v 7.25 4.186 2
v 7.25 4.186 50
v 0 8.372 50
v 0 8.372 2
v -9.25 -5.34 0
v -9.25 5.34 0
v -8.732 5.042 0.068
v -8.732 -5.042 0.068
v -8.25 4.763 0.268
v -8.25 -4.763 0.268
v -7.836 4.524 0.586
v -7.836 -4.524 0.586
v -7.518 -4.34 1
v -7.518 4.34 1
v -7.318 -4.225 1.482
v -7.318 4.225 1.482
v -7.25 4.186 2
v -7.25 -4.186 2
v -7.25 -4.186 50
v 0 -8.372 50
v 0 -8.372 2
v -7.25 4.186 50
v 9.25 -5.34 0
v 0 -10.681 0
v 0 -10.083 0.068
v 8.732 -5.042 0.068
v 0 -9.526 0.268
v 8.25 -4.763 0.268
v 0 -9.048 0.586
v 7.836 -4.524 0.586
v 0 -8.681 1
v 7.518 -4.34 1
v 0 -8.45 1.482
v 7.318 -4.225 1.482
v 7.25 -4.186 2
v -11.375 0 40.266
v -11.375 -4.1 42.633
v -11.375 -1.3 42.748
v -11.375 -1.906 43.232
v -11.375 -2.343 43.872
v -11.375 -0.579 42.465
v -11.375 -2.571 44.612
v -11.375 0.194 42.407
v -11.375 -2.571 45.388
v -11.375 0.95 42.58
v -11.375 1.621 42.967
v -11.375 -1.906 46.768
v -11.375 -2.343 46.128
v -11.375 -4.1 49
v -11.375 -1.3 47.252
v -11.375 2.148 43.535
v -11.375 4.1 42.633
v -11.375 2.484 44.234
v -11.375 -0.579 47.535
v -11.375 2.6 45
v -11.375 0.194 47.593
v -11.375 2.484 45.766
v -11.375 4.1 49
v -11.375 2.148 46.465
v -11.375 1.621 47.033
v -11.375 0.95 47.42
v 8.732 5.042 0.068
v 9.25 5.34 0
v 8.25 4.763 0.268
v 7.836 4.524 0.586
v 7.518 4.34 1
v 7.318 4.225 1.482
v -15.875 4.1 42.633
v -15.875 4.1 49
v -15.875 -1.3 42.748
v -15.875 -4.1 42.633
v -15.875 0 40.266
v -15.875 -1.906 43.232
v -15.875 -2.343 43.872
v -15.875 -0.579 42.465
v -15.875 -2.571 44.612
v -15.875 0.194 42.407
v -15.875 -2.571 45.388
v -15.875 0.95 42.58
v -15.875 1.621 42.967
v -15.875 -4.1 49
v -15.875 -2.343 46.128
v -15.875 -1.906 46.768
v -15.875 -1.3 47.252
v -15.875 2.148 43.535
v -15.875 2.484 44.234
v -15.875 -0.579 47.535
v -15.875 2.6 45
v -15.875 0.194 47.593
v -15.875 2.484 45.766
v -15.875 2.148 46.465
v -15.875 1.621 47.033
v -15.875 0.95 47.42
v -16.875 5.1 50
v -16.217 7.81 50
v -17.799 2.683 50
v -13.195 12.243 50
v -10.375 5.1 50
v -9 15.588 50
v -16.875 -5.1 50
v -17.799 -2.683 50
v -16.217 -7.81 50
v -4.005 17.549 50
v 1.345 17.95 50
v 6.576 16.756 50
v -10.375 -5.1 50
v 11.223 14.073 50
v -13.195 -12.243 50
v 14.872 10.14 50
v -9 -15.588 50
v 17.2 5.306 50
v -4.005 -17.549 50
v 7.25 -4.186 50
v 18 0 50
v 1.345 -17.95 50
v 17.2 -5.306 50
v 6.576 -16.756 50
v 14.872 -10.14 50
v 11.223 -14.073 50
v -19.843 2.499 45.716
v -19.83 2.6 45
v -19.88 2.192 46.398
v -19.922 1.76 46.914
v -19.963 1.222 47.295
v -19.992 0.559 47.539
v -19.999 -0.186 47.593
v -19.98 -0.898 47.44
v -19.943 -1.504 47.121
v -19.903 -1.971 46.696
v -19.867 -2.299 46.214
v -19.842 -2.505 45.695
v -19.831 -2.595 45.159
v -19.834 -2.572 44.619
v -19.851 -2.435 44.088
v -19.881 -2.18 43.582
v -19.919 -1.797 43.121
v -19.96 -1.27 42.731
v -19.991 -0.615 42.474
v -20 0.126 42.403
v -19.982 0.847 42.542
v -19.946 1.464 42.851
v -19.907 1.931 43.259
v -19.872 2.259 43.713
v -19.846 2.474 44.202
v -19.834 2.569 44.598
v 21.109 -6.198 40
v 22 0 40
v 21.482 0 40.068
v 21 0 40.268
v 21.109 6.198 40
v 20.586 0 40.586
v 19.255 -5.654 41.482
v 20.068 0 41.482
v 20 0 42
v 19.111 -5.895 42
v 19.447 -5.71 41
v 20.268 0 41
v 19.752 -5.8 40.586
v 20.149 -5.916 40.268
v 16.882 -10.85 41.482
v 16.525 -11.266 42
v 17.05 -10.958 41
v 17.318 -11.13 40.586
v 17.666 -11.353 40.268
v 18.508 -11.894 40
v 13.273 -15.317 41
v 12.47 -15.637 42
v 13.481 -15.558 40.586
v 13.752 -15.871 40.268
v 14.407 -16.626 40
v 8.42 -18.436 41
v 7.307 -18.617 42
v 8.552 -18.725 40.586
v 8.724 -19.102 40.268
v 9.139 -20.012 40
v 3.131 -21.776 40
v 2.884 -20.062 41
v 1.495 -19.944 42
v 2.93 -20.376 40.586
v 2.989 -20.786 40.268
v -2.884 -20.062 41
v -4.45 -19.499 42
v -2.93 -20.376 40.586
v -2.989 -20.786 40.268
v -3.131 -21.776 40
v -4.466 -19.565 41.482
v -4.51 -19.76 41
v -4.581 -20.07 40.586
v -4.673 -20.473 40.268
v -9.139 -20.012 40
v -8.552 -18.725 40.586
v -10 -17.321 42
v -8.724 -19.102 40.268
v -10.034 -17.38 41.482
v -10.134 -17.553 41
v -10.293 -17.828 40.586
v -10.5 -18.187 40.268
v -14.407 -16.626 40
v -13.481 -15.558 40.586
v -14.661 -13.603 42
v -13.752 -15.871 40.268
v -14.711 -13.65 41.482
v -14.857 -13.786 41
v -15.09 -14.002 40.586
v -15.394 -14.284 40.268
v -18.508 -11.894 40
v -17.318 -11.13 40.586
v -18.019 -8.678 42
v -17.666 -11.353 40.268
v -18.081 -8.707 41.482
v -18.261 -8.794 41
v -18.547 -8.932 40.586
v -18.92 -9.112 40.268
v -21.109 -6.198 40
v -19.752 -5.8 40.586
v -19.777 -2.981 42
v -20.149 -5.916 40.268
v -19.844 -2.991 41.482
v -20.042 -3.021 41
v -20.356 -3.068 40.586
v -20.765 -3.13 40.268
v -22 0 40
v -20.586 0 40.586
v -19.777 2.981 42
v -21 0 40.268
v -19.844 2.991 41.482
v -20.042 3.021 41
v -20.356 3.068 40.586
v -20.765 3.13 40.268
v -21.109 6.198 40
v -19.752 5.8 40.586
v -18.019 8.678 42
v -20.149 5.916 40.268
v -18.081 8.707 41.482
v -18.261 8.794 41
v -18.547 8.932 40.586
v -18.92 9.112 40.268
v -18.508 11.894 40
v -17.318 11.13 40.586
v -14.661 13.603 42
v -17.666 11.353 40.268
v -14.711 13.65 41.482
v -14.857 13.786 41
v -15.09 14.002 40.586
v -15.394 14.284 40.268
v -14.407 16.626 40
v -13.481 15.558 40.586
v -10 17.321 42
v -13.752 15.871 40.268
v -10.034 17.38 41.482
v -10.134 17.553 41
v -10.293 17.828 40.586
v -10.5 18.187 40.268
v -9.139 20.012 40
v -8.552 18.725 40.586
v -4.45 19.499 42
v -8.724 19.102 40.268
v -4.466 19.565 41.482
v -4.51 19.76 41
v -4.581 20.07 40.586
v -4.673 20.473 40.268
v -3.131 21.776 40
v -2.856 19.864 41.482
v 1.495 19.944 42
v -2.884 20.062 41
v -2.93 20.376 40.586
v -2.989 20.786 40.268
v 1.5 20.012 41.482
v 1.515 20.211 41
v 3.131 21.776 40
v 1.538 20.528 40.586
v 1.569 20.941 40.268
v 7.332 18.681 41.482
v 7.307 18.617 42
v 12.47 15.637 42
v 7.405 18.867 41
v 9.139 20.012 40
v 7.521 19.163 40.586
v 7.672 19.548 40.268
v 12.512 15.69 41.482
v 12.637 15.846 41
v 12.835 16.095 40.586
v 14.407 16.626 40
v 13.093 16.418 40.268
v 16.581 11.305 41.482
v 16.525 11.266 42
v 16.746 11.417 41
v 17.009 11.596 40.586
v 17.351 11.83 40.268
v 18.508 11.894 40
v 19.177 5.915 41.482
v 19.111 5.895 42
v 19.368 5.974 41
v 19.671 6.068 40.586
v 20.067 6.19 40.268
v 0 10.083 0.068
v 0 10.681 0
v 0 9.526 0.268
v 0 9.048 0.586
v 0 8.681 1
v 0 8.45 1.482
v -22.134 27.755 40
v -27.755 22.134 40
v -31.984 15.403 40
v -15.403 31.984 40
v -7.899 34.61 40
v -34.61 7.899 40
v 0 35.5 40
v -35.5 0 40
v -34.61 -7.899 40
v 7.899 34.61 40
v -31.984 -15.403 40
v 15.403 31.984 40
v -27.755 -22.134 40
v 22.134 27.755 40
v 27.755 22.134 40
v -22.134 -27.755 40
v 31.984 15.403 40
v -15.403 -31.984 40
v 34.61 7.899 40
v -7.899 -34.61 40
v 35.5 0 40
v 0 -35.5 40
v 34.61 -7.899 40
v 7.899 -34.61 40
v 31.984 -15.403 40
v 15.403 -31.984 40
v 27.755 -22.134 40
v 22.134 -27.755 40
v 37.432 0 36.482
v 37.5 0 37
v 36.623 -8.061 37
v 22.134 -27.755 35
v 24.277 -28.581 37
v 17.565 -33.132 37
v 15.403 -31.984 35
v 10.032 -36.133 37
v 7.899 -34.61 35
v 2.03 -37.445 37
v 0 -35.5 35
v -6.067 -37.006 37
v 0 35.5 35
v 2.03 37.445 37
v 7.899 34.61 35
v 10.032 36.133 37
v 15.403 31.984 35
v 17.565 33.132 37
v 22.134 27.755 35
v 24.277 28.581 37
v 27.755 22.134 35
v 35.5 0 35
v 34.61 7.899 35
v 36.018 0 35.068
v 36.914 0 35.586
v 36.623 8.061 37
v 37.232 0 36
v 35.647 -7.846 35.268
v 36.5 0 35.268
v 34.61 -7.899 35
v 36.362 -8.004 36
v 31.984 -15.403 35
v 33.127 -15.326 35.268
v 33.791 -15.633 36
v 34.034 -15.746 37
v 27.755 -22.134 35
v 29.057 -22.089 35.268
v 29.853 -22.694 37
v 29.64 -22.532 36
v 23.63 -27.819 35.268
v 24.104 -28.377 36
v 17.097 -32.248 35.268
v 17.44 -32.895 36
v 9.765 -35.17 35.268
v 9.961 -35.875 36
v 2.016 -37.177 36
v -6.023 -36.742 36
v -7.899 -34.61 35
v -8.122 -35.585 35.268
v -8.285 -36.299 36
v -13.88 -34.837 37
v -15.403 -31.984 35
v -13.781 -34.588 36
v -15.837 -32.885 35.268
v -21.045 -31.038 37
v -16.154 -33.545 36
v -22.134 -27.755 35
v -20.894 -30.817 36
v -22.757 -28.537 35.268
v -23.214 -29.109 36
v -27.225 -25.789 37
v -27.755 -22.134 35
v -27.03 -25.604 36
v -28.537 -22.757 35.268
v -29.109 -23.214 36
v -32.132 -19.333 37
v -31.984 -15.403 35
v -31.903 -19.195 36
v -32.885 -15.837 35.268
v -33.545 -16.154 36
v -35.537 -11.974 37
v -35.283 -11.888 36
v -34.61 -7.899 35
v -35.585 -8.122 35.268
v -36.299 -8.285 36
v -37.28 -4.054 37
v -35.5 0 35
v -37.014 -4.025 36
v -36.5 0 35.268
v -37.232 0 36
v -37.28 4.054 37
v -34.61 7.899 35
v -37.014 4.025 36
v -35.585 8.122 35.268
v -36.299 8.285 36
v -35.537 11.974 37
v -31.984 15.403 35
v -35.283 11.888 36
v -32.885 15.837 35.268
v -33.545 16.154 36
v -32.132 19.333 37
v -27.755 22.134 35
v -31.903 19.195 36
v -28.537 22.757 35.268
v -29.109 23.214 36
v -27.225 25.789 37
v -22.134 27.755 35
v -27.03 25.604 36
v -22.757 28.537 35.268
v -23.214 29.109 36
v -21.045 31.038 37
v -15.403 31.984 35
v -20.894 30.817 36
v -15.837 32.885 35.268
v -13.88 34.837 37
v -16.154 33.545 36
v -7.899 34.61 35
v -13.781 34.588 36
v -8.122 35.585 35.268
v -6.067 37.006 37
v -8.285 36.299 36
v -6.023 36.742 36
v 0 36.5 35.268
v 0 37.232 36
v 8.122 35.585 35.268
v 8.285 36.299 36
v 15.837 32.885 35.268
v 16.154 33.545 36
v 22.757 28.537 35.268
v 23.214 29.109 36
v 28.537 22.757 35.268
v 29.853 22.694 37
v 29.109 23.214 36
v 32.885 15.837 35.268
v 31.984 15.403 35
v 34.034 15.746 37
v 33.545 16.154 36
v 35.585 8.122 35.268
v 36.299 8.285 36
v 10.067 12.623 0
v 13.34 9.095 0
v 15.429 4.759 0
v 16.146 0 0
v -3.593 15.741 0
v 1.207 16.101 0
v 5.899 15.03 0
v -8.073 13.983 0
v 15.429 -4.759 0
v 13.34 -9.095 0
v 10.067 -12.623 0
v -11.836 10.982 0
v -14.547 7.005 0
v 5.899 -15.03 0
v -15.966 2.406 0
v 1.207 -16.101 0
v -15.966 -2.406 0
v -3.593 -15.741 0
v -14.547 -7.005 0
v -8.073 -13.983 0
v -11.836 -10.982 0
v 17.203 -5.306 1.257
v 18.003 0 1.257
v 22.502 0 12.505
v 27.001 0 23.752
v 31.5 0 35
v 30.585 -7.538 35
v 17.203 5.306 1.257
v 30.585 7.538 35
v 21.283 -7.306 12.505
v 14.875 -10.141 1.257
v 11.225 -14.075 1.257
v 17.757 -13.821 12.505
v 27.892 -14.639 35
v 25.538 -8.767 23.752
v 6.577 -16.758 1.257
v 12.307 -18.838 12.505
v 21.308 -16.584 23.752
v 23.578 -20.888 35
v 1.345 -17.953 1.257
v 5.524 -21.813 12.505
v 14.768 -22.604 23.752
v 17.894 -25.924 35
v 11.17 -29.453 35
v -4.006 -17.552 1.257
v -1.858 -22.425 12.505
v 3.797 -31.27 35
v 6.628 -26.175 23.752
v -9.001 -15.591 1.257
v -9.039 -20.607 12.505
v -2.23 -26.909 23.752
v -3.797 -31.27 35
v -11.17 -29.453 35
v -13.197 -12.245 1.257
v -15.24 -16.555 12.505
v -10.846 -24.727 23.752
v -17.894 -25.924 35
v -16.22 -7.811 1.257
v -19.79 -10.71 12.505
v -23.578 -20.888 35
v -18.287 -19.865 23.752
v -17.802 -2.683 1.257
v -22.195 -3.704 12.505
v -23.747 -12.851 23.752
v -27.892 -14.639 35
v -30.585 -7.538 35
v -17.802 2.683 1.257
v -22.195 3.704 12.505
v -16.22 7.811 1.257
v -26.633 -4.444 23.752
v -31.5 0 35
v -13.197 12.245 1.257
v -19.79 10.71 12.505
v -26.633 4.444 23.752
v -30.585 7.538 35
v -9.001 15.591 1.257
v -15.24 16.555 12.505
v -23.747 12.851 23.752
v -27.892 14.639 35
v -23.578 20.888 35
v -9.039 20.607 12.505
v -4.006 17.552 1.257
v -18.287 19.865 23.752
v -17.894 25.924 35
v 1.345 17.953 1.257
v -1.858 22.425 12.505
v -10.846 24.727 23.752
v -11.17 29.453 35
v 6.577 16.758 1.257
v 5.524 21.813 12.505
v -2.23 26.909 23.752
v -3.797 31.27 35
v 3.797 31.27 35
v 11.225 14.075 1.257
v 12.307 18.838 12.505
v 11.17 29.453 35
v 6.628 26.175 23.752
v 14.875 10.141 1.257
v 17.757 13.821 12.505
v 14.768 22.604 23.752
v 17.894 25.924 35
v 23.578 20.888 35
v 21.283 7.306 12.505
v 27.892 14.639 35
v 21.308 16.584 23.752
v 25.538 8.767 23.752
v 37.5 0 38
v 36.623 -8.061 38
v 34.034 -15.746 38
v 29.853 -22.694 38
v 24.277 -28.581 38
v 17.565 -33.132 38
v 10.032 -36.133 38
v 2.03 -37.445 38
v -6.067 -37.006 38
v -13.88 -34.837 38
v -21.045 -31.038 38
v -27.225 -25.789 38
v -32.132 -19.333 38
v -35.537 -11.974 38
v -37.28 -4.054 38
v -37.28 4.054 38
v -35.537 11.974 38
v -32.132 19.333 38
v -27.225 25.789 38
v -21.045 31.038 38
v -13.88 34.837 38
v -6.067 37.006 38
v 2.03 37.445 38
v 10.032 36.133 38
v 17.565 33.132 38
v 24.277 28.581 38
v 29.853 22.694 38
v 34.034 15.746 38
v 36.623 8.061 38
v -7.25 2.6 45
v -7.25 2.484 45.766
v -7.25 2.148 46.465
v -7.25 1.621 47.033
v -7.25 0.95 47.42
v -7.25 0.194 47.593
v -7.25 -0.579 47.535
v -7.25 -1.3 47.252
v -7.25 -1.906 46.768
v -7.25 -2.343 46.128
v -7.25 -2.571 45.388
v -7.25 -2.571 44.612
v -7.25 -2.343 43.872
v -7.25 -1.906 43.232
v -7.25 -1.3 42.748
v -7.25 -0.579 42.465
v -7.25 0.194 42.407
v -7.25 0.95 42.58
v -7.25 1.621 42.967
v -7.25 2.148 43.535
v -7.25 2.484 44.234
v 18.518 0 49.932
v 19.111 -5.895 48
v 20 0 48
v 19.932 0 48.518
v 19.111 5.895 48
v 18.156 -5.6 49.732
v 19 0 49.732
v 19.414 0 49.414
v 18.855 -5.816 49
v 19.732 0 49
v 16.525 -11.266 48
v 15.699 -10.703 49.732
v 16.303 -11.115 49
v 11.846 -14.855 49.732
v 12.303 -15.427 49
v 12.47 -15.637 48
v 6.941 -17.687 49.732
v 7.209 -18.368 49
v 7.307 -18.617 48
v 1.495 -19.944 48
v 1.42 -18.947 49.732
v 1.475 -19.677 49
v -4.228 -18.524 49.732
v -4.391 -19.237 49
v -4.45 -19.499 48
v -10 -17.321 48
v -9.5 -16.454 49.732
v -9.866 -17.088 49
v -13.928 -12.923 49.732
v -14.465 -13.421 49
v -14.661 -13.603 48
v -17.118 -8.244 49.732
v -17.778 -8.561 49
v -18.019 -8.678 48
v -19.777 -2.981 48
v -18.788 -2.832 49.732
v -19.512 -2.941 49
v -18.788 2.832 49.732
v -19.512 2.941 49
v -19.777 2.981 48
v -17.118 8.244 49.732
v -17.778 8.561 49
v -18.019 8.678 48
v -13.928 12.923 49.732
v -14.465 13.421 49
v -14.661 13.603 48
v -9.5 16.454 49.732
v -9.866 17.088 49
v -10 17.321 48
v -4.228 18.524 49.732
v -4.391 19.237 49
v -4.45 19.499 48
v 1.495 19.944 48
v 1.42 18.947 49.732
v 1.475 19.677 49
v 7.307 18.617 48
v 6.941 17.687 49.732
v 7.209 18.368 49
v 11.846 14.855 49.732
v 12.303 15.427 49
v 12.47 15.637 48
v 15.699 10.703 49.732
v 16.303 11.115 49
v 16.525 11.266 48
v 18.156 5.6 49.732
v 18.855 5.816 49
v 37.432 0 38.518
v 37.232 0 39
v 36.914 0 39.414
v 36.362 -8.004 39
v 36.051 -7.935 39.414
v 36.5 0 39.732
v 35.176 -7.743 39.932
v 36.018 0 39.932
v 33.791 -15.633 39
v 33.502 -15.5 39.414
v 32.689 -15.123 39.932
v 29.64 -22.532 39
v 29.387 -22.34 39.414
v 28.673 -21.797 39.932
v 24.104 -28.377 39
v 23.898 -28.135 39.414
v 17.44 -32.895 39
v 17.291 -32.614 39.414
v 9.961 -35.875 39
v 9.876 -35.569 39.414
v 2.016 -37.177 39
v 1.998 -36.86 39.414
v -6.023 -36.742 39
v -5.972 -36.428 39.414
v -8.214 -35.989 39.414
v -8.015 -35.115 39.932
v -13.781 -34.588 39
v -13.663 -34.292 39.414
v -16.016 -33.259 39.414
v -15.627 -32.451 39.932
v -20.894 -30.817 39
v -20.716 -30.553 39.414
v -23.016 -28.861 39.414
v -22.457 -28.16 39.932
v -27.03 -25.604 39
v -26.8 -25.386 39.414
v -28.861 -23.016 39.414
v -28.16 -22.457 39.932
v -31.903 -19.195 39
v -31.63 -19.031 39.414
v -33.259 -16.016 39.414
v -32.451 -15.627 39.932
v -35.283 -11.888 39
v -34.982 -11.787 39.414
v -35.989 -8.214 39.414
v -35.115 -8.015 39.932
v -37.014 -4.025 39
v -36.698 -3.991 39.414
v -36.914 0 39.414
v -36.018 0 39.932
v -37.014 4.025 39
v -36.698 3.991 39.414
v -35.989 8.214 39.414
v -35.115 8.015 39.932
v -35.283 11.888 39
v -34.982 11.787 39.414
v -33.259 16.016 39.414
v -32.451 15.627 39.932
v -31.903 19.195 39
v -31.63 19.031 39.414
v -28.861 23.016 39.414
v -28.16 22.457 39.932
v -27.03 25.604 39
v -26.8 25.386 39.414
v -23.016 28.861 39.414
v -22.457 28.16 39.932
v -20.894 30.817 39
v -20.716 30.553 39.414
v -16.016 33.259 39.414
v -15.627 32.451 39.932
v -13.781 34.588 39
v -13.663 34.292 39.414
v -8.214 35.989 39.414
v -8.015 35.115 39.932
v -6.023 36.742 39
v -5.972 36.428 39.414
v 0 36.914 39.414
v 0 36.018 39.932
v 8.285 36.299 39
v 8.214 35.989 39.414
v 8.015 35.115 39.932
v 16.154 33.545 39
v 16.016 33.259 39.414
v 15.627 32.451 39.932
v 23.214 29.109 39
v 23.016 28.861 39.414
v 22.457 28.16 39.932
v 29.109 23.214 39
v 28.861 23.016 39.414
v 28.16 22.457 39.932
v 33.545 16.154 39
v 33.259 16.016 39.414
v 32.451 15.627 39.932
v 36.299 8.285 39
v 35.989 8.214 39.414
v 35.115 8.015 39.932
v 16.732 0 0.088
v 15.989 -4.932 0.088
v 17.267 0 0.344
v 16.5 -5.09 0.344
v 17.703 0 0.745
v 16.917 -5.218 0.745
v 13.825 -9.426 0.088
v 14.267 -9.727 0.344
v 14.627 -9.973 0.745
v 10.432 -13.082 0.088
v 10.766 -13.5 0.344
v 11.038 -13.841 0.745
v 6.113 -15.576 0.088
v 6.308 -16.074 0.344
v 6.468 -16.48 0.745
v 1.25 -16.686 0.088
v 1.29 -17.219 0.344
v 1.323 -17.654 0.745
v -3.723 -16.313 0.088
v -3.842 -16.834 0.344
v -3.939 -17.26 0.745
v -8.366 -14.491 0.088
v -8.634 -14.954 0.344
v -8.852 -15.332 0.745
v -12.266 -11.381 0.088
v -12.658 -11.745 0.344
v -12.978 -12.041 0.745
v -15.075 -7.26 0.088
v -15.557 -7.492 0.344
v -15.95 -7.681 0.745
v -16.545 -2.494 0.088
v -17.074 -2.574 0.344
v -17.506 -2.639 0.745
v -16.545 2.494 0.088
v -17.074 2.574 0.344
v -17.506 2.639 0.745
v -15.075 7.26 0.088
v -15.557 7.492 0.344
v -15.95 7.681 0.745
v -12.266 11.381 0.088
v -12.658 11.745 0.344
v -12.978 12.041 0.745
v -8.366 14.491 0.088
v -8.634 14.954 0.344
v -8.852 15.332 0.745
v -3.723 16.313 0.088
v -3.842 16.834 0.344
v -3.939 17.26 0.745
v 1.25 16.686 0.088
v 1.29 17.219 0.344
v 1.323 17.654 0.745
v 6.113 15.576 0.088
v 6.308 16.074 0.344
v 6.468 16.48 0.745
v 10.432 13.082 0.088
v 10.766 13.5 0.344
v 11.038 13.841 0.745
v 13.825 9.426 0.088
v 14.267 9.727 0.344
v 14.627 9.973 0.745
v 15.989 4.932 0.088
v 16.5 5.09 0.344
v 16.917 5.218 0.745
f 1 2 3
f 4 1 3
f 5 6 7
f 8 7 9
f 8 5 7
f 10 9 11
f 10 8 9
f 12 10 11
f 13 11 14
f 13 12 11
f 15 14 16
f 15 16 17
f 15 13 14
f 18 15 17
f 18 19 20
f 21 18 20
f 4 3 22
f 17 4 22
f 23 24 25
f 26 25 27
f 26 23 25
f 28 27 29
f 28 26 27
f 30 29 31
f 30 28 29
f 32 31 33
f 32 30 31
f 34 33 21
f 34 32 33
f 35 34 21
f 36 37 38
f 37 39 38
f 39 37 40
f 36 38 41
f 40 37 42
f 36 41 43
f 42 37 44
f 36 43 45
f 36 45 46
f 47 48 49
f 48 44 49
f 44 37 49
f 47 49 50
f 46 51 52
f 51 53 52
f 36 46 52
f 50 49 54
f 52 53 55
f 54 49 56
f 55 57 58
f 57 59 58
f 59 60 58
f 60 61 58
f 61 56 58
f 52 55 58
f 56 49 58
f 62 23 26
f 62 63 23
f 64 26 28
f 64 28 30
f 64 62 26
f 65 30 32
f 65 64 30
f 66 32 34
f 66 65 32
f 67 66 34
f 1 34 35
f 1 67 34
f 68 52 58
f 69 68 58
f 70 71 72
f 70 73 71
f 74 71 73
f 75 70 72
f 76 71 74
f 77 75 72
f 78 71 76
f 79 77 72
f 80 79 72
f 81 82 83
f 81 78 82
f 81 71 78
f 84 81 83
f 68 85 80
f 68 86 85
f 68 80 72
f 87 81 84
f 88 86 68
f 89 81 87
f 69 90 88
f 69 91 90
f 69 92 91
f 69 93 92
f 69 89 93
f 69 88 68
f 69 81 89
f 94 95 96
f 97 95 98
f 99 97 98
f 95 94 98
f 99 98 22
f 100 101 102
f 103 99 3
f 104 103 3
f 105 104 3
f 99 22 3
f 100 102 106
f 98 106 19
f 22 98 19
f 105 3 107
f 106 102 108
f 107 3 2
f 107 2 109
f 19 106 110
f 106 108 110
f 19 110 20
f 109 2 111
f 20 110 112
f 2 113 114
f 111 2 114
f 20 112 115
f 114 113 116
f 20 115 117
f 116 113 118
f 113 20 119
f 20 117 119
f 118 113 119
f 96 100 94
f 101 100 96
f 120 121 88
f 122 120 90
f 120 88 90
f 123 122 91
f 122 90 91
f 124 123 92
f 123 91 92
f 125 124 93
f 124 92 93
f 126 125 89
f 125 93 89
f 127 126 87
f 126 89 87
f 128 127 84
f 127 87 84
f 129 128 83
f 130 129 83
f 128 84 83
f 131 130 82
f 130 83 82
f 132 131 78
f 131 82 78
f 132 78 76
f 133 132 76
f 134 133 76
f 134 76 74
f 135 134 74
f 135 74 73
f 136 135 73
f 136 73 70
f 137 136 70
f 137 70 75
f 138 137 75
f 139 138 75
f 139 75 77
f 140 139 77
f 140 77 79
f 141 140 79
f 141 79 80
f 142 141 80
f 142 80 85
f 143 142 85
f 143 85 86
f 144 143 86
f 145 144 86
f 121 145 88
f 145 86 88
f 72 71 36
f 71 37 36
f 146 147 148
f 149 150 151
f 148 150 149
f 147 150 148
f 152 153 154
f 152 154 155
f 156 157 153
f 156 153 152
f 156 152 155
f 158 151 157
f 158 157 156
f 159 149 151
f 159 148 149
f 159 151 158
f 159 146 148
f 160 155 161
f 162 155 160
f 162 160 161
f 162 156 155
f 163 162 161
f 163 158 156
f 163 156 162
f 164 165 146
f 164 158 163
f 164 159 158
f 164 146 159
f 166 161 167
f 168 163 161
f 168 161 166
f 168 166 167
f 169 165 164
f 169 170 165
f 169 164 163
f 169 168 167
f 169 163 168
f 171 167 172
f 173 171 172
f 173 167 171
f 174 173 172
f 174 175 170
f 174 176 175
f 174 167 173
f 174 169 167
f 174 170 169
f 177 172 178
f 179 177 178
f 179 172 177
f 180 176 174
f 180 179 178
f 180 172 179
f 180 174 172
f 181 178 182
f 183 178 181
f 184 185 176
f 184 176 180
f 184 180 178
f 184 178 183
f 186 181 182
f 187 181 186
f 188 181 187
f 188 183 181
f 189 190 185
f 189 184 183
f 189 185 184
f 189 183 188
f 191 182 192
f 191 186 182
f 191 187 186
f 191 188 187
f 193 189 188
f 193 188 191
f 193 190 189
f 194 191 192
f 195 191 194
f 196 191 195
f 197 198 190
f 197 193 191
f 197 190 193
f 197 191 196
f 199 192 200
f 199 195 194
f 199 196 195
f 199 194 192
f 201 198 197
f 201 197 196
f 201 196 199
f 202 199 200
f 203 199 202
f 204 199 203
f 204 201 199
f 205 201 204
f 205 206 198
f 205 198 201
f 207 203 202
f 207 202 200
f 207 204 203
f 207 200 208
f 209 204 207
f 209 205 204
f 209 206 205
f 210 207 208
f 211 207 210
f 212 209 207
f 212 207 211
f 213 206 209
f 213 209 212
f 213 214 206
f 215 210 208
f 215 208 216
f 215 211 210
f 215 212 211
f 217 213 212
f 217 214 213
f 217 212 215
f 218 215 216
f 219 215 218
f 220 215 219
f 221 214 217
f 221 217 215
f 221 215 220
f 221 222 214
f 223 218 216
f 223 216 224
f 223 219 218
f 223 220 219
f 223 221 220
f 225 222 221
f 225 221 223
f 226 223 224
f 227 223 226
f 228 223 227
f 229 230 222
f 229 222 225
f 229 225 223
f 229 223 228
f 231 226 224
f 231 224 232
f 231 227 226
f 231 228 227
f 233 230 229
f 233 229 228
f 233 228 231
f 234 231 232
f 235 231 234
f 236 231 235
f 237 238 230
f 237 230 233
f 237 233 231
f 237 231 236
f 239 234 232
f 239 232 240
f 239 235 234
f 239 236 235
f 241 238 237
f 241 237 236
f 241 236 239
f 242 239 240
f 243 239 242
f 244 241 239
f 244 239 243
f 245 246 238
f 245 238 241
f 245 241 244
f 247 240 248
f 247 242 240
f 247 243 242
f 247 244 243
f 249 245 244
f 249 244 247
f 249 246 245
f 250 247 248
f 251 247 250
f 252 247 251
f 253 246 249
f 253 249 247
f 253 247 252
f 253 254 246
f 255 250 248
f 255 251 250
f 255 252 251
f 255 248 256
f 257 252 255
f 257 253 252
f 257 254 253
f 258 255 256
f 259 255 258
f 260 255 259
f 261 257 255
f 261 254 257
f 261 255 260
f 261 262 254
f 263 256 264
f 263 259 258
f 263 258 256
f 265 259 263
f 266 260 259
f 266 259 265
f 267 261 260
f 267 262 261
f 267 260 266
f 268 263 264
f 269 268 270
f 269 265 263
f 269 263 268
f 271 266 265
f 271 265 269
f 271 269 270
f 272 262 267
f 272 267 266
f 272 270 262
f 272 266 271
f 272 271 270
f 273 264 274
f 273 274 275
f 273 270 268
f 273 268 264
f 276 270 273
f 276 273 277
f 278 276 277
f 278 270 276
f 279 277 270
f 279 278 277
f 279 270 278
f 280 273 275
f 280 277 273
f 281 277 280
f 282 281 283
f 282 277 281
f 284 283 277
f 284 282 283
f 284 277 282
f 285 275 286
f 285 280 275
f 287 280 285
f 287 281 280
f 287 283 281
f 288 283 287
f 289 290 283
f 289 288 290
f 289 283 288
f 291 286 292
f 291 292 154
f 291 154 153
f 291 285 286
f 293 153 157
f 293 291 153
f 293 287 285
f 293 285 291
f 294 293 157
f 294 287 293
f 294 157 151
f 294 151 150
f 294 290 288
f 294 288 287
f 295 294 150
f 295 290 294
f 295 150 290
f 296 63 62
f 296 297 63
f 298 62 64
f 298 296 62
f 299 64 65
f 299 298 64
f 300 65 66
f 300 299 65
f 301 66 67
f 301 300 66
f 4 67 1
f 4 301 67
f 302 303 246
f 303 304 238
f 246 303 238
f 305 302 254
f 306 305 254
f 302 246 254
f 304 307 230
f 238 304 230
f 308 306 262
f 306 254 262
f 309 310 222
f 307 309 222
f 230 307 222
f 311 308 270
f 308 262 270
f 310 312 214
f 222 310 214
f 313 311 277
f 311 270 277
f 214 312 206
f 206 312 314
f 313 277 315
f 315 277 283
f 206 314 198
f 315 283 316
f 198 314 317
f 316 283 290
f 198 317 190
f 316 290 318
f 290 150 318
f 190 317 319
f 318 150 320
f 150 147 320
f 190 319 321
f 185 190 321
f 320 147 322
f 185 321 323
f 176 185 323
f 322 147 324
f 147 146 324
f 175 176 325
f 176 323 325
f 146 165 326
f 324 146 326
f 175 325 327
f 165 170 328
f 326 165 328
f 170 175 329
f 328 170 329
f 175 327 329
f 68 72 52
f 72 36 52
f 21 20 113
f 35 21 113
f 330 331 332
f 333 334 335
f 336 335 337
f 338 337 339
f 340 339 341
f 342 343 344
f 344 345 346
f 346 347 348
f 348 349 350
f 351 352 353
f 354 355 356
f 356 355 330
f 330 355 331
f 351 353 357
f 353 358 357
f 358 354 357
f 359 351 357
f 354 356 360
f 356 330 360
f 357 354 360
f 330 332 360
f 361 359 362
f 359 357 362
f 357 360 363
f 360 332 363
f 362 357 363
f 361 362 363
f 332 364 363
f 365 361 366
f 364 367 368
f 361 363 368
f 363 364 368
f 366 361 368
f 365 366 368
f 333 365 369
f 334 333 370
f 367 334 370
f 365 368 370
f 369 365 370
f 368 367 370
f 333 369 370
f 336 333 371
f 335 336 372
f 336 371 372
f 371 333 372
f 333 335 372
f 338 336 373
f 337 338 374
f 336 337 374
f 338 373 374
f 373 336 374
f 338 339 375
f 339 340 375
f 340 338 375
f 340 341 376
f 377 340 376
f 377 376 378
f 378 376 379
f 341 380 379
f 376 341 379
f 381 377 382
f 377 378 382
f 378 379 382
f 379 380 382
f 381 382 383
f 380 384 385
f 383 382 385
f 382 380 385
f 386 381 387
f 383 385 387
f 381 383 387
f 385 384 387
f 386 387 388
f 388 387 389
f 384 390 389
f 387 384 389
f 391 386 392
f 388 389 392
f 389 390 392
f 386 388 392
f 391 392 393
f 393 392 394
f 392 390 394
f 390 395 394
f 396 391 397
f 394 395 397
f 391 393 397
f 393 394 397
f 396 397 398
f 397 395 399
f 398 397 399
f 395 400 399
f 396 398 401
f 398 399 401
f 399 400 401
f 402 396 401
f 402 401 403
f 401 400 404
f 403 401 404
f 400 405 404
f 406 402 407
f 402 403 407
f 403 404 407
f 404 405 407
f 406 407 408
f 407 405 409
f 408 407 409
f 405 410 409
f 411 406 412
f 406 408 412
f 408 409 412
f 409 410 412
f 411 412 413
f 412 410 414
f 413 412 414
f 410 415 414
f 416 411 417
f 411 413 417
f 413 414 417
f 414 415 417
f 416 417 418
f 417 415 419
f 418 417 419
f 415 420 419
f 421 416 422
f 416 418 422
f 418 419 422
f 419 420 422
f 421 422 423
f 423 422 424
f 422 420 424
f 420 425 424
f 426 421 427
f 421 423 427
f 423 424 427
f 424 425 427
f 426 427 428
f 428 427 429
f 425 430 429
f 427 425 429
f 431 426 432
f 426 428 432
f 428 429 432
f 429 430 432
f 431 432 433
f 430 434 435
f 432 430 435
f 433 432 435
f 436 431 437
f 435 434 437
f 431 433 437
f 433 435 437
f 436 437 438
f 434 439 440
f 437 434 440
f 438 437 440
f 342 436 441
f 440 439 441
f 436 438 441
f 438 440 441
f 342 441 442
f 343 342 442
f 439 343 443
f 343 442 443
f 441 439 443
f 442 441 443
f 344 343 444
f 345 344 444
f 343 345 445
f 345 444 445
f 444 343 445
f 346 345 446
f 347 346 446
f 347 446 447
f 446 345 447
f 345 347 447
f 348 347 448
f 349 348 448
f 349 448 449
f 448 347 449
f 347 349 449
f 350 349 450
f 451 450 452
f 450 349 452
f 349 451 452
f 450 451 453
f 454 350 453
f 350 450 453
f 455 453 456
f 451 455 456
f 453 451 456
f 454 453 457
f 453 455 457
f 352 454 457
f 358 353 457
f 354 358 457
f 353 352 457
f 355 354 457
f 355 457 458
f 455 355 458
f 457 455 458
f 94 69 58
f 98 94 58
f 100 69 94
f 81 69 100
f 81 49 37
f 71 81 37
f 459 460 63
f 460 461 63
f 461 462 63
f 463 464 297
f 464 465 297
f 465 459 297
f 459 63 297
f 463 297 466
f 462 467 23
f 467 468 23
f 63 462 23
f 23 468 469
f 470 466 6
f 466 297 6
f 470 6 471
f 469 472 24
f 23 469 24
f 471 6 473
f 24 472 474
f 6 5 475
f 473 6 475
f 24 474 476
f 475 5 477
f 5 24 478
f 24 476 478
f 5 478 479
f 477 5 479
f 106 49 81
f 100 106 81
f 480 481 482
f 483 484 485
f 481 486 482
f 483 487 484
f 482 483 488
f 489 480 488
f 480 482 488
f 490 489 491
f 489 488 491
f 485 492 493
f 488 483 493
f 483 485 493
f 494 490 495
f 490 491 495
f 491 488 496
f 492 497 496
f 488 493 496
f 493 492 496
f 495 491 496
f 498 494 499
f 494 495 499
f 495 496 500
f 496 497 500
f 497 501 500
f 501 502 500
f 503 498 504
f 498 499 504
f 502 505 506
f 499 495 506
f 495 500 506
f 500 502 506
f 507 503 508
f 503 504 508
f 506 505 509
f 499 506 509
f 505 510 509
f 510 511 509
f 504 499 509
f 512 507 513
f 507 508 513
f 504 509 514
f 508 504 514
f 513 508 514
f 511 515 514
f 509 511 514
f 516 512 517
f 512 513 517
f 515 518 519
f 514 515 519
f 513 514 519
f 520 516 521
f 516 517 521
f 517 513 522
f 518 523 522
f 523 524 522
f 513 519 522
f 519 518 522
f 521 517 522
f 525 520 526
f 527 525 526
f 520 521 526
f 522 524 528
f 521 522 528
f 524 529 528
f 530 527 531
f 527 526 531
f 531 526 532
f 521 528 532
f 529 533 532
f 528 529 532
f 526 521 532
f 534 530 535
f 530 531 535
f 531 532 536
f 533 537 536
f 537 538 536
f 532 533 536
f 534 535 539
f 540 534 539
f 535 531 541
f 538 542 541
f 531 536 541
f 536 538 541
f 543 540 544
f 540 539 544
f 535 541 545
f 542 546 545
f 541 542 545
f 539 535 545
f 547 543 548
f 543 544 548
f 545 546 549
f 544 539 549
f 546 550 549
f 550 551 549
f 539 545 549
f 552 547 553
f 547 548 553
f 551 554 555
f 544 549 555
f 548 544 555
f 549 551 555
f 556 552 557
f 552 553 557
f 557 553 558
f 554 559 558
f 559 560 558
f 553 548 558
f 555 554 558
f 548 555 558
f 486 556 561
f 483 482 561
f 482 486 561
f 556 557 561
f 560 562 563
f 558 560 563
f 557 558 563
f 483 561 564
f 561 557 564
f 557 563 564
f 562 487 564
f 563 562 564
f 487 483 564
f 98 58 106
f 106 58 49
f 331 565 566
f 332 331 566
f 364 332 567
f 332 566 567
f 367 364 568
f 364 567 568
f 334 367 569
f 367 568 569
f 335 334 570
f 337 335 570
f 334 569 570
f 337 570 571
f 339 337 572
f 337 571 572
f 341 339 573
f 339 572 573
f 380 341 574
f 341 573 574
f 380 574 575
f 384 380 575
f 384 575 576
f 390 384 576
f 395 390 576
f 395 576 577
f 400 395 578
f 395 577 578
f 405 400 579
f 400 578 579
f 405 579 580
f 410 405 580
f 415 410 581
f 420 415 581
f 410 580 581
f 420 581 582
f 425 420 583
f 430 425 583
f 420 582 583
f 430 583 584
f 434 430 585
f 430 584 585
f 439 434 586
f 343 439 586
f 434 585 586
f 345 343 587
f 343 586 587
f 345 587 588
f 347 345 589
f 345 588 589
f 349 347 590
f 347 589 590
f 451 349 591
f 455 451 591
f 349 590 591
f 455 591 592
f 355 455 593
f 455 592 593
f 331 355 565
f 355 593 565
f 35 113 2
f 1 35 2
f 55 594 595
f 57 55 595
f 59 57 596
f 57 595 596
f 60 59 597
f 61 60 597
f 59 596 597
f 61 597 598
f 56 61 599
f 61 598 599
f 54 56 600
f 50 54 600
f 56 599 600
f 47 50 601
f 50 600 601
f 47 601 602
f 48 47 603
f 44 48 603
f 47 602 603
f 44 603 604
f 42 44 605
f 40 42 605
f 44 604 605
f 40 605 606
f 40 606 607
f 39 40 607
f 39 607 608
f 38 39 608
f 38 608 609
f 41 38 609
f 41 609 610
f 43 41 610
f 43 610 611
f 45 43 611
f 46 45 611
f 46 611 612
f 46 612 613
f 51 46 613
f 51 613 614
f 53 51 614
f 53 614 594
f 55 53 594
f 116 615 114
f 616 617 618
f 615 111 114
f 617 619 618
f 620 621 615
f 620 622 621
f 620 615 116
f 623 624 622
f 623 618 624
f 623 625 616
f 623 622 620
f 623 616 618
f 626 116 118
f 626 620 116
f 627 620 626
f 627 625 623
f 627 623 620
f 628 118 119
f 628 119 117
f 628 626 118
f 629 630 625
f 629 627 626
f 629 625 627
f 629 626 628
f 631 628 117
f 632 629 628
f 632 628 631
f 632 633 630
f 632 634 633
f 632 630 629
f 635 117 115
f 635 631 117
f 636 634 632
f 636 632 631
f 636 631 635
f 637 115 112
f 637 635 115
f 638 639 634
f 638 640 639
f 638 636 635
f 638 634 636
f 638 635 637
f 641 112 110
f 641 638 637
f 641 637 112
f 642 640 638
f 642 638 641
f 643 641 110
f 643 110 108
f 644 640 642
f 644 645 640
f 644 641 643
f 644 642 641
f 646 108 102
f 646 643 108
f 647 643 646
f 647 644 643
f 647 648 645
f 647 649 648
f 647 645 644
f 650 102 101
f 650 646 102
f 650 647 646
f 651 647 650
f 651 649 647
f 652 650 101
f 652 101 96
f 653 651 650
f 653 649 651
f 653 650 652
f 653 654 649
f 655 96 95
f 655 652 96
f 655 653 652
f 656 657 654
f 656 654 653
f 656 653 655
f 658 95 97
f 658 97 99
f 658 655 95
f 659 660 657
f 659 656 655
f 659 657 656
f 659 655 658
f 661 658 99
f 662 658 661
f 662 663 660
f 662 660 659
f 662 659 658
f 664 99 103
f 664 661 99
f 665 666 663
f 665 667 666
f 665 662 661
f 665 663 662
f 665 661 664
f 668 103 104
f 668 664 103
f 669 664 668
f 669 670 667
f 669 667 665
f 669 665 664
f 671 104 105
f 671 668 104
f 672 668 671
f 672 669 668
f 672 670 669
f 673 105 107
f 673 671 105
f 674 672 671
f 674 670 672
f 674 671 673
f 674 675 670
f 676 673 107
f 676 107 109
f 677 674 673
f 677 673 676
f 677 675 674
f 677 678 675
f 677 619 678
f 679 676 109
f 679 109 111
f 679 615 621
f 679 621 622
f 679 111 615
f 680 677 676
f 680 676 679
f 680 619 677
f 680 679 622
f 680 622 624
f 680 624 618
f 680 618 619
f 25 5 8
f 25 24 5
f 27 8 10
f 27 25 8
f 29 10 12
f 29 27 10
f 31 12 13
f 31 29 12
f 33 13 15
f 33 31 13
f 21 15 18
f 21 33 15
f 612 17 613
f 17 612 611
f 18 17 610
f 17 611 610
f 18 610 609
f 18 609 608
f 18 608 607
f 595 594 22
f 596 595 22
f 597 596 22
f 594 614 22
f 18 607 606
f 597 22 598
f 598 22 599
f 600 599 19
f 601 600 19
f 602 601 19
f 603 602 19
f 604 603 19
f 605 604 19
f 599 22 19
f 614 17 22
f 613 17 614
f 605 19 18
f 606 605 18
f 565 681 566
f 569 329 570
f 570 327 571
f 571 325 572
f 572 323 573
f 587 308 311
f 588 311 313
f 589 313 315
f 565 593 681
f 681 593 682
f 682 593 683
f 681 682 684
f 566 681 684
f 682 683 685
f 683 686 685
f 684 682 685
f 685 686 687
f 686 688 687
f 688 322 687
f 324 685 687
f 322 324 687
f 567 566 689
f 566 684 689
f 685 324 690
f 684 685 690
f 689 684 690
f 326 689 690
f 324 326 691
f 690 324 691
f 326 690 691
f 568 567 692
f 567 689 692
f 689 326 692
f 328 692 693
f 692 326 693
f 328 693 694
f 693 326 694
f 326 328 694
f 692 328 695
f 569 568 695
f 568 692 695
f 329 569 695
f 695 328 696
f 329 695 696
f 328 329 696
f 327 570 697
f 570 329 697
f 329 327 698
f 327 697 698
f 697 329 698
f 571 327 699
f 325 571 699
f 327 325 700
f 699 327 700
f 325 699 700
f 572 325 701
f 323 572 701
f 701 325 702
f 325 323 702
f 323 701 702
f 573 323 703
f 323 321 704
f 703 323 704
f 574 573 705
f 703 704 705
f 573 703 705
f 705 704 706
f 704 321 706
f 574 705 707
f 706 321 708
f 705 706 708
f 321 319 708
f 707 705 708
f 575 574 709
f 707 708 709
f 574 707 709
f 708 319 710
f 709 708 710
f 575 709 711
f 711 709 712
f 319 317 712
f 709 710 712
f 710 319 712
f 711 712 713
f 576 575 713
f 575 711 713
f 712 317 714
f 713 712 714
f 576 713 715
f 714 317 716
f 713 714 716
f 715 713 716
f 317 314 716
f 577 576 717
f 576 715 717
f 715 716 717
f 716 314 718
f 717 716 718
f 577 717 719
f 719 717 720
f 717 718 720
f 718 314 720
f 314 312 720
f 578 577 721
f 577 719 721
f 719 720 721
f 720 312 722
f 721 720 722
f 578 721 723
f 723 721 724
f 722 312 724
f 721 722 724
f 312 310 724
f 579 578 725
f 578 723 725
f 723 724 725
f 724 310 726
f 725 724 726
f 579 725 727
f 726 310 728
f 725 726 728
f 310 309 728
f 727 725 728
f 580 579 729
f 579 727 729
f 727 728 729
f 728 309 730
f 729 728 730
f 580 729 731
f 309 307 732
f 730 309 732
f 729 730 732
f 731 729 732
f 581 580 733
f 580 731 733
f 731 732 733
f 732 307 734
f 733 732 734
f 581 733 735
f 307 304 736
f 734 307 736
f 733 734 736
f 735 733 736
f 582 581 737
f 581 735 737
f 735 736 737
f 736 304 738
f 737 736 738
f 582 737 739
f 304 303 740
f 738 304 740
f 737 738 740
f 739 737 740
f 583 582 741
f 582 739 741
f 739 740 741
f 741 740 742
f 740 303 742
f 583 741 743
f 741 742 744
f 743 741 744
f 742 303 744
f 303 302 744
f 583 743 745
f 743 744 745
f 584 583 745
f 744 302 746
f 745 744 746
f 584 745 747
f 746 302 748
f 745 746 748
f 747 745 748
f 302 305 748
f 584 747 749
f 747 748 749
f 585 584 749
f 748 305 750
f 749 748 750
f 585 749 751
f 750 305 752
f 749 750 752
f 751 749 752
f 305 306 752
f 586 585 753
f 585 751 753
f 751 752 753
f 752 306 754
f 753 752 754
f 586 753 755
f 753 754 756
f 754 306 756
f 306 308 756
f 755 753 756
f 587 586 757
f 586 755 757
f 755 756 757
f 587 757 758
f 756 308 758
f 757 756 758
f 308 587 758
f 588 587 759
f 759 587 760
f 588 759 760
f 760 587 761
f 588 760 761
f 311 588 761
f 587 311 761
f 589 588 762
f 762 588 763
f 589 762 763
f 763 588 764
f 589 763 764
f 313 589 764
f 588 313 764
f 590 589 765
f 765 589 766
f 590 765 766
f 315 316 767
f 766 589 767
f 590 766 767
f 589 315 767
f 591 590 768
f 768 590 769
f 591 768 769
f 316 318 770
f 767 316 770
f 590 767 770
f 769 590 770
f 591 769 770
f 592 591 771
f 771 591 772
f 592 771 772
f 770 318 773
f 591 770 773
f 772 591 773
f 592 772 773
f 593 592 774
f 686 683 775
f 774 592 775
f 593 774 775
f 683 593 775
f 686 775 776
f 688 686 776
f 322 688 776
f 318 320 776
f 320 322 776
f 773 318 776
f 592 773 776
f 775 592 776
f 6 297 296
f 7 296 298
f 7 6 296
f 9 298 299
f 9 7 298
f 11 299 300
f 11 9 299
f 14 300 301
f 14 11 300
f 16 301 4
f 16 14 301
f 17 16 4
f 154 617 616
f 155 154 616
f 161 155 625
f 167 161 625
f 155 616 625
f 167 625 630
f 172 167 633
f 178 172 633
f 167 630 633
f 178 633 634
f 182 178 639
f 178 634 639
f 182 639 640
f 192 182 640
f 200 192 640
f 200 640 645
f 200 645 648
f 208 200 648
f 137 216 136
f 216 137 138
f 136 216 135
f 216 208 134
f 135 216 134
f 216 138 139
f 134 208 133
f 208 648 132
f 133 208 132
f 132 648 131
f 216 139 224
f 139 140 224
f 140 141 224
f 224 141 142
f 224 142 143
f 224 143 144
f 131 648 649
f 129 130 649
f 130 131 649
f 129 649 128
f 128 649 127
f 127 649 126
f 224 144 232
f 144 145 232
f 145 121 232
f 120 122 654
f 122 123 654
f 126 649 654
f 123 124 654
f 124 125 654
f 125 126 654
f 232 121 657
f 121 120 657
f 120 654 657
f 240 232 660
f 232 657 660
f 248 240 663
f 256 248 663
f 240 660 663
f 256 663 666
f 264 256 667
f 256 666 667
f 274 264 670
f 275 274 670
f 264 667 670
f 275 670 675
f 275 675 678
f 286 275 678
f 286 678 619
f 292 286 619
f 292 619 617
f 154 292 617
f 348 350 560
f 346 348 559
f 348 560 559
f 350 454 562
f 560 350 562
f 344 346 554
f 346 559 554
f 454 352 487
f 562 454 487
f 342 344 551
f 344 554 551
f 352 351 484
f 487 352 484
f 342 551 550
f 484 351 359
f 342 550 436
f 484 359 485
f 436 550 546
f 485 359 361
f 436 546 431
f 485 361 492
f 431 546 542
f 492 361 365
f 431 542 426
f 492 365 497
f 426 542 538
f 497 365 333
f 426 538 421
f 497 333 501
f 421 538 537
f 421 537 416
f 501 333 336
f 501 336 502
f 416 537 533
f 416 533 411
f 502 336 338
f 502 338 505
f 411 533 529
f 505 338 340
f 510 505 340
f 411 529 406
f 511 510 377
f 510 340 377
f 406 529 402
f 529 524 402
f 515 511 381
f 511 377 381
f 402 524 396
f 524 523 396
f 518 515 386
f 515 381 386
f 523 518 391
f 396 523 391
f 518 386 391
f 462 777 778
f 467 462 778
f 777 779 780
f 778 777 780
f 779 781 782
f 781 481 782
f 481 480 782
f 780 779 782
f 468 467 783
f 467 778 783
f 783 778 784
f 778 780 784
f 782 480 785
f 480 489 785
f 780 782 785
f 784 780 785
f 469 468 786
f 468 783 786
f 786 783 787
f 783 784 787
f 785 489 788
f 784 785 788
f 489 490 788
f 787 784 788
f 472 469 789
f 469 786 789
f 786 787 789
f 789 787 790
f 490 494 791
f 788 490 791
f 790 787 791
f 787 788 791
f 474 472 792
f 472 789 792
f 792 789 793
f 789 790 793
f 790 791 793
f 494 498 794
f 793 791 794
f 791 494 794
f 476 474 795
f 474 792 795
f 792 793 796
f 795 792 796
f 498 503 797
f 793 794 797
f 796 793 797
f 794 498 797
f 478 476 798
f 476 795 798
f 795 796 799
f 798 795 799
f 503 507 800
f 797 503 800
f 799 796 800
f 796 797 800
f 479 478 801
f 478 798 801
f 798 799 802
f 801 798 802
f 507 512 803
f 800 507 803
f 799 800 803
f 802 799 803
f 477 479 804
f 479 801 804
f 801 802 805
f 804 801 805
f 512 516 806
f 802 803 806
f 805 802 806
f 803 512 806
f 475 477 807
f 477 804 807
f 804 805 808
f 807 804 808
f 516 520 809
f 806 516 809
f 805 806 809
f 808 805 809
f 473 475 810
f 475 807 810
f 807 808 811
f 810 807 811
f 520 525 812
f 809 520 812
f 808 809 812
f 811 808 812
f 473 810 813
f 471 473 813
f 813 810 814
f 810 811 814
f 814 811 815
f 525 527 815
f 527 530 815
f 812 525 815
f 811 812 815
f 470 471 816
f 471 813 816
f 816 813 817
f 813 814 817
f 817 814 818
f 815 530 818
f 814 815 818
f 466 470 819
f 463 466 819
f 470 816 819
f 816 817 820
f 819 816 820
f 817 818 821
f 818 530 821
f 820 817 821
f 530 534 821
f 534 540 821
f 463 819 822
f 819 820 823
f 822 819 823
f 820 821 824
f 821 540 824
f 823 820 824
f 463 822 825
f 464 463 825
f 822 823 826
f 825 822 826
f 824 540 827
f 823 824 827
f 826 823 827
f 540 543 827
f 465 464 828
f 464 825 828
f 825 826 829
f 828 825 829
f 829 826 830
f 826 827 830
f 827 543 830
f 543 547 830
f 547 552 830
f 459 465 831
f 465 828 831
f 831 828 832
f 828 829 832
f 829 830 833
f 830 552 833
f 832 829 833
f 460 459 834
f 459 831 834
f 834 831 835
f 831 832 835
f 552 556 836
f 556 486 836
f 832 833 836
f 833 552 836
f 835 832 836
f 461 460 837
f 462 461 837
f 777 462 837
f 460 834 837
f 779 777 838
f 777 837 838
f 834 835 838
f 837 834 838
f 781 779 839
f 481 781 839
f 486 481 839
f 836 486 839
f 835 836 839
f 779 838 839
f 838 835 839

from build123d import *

# Parameters (mm, degrees)
F3_DEPTH = 50.001
F4_R     = 2.6
F5_DEPTH = 37.501
F9_DEPTH = 2.25
F10_R    = 2
F11_SIZE = 1


with BuildPart() as f1:
    # F0 (on Front) → F1 (revolve)
    with BuildSketch(Plane.XZ):
        Polygon((0, 0), (17.5, 0), (31.5, 35), (37.5, 35), (37.5, 40), (20, 40), (20, 50), (0, 50), align=None)
    revolve(axis=Axis((0, 0, 25), (0, 0, -1)))

    # F2 (on face) → F3 (cut, through all)
    with BuildSketch(Plane.XY.offset(50)):
        Polygon((0, -8.371579), (7.25, -4.185789), (7.25, 4.185789), (0, 8.371579), (-7.25, 4.185789), (-7.25, -4.185789), align=None)
    extrude(amount=-F3_DEPTH, mode=Mode.SUBTRACT)

    # F4 (on Right) → F5 (cut, through all)
    with BuildSketch(Plane.YZ):
        with Locations((0, 45)):
            Circle(F4_R)
    extrude(amount=-F5_DEPTH, mode=Mode.SUBTRACT)

    # F8 (on face) → F9 (cut, symmetric)
    with BuildSketch(Plane.YZ.offset(-13.625)):
        Polygon((4.1, 42.632864), (4.1, 55), (-4.1, 55), (-4.1, 42.632864), (0, 40.265728), align=None)
    extrude(amount=F9_DEPTH, both=True, mode=Mode.SUBTRACT)

    # F10
    f10_edges = [f1.edges().sort_by_distance(p)[0] for p in [
        (-20, 0, 50),
        (-20, 0, 40),
        (-37.5, 0, 40),
        (-37.5, 0, 35),
        (-17.5, 0, 0),
        (-3.625, -6.278684, 0),
        (3.625, -6.278684, 0),
        (7.25, 0, 0),
        (3.625, 6.278684, 0),
        (-3.625, 6.278684, 0),
        (-7.25, 0, 0),
    ]]
    fillet(f10_edges, radius=F10_R)

    # F11
    f11_edges = [f1.edges().sort_by_distance(p)[0] for p in [
        (-13.625, 4.1, 50),
        (-11.375, 0, 50),
        (-13.625, -4.1, 50),
        (-15.875, 0, 50),
    ]]
    chamfer(f11_edges, length=F11_SIZE)


solid = f1.part
